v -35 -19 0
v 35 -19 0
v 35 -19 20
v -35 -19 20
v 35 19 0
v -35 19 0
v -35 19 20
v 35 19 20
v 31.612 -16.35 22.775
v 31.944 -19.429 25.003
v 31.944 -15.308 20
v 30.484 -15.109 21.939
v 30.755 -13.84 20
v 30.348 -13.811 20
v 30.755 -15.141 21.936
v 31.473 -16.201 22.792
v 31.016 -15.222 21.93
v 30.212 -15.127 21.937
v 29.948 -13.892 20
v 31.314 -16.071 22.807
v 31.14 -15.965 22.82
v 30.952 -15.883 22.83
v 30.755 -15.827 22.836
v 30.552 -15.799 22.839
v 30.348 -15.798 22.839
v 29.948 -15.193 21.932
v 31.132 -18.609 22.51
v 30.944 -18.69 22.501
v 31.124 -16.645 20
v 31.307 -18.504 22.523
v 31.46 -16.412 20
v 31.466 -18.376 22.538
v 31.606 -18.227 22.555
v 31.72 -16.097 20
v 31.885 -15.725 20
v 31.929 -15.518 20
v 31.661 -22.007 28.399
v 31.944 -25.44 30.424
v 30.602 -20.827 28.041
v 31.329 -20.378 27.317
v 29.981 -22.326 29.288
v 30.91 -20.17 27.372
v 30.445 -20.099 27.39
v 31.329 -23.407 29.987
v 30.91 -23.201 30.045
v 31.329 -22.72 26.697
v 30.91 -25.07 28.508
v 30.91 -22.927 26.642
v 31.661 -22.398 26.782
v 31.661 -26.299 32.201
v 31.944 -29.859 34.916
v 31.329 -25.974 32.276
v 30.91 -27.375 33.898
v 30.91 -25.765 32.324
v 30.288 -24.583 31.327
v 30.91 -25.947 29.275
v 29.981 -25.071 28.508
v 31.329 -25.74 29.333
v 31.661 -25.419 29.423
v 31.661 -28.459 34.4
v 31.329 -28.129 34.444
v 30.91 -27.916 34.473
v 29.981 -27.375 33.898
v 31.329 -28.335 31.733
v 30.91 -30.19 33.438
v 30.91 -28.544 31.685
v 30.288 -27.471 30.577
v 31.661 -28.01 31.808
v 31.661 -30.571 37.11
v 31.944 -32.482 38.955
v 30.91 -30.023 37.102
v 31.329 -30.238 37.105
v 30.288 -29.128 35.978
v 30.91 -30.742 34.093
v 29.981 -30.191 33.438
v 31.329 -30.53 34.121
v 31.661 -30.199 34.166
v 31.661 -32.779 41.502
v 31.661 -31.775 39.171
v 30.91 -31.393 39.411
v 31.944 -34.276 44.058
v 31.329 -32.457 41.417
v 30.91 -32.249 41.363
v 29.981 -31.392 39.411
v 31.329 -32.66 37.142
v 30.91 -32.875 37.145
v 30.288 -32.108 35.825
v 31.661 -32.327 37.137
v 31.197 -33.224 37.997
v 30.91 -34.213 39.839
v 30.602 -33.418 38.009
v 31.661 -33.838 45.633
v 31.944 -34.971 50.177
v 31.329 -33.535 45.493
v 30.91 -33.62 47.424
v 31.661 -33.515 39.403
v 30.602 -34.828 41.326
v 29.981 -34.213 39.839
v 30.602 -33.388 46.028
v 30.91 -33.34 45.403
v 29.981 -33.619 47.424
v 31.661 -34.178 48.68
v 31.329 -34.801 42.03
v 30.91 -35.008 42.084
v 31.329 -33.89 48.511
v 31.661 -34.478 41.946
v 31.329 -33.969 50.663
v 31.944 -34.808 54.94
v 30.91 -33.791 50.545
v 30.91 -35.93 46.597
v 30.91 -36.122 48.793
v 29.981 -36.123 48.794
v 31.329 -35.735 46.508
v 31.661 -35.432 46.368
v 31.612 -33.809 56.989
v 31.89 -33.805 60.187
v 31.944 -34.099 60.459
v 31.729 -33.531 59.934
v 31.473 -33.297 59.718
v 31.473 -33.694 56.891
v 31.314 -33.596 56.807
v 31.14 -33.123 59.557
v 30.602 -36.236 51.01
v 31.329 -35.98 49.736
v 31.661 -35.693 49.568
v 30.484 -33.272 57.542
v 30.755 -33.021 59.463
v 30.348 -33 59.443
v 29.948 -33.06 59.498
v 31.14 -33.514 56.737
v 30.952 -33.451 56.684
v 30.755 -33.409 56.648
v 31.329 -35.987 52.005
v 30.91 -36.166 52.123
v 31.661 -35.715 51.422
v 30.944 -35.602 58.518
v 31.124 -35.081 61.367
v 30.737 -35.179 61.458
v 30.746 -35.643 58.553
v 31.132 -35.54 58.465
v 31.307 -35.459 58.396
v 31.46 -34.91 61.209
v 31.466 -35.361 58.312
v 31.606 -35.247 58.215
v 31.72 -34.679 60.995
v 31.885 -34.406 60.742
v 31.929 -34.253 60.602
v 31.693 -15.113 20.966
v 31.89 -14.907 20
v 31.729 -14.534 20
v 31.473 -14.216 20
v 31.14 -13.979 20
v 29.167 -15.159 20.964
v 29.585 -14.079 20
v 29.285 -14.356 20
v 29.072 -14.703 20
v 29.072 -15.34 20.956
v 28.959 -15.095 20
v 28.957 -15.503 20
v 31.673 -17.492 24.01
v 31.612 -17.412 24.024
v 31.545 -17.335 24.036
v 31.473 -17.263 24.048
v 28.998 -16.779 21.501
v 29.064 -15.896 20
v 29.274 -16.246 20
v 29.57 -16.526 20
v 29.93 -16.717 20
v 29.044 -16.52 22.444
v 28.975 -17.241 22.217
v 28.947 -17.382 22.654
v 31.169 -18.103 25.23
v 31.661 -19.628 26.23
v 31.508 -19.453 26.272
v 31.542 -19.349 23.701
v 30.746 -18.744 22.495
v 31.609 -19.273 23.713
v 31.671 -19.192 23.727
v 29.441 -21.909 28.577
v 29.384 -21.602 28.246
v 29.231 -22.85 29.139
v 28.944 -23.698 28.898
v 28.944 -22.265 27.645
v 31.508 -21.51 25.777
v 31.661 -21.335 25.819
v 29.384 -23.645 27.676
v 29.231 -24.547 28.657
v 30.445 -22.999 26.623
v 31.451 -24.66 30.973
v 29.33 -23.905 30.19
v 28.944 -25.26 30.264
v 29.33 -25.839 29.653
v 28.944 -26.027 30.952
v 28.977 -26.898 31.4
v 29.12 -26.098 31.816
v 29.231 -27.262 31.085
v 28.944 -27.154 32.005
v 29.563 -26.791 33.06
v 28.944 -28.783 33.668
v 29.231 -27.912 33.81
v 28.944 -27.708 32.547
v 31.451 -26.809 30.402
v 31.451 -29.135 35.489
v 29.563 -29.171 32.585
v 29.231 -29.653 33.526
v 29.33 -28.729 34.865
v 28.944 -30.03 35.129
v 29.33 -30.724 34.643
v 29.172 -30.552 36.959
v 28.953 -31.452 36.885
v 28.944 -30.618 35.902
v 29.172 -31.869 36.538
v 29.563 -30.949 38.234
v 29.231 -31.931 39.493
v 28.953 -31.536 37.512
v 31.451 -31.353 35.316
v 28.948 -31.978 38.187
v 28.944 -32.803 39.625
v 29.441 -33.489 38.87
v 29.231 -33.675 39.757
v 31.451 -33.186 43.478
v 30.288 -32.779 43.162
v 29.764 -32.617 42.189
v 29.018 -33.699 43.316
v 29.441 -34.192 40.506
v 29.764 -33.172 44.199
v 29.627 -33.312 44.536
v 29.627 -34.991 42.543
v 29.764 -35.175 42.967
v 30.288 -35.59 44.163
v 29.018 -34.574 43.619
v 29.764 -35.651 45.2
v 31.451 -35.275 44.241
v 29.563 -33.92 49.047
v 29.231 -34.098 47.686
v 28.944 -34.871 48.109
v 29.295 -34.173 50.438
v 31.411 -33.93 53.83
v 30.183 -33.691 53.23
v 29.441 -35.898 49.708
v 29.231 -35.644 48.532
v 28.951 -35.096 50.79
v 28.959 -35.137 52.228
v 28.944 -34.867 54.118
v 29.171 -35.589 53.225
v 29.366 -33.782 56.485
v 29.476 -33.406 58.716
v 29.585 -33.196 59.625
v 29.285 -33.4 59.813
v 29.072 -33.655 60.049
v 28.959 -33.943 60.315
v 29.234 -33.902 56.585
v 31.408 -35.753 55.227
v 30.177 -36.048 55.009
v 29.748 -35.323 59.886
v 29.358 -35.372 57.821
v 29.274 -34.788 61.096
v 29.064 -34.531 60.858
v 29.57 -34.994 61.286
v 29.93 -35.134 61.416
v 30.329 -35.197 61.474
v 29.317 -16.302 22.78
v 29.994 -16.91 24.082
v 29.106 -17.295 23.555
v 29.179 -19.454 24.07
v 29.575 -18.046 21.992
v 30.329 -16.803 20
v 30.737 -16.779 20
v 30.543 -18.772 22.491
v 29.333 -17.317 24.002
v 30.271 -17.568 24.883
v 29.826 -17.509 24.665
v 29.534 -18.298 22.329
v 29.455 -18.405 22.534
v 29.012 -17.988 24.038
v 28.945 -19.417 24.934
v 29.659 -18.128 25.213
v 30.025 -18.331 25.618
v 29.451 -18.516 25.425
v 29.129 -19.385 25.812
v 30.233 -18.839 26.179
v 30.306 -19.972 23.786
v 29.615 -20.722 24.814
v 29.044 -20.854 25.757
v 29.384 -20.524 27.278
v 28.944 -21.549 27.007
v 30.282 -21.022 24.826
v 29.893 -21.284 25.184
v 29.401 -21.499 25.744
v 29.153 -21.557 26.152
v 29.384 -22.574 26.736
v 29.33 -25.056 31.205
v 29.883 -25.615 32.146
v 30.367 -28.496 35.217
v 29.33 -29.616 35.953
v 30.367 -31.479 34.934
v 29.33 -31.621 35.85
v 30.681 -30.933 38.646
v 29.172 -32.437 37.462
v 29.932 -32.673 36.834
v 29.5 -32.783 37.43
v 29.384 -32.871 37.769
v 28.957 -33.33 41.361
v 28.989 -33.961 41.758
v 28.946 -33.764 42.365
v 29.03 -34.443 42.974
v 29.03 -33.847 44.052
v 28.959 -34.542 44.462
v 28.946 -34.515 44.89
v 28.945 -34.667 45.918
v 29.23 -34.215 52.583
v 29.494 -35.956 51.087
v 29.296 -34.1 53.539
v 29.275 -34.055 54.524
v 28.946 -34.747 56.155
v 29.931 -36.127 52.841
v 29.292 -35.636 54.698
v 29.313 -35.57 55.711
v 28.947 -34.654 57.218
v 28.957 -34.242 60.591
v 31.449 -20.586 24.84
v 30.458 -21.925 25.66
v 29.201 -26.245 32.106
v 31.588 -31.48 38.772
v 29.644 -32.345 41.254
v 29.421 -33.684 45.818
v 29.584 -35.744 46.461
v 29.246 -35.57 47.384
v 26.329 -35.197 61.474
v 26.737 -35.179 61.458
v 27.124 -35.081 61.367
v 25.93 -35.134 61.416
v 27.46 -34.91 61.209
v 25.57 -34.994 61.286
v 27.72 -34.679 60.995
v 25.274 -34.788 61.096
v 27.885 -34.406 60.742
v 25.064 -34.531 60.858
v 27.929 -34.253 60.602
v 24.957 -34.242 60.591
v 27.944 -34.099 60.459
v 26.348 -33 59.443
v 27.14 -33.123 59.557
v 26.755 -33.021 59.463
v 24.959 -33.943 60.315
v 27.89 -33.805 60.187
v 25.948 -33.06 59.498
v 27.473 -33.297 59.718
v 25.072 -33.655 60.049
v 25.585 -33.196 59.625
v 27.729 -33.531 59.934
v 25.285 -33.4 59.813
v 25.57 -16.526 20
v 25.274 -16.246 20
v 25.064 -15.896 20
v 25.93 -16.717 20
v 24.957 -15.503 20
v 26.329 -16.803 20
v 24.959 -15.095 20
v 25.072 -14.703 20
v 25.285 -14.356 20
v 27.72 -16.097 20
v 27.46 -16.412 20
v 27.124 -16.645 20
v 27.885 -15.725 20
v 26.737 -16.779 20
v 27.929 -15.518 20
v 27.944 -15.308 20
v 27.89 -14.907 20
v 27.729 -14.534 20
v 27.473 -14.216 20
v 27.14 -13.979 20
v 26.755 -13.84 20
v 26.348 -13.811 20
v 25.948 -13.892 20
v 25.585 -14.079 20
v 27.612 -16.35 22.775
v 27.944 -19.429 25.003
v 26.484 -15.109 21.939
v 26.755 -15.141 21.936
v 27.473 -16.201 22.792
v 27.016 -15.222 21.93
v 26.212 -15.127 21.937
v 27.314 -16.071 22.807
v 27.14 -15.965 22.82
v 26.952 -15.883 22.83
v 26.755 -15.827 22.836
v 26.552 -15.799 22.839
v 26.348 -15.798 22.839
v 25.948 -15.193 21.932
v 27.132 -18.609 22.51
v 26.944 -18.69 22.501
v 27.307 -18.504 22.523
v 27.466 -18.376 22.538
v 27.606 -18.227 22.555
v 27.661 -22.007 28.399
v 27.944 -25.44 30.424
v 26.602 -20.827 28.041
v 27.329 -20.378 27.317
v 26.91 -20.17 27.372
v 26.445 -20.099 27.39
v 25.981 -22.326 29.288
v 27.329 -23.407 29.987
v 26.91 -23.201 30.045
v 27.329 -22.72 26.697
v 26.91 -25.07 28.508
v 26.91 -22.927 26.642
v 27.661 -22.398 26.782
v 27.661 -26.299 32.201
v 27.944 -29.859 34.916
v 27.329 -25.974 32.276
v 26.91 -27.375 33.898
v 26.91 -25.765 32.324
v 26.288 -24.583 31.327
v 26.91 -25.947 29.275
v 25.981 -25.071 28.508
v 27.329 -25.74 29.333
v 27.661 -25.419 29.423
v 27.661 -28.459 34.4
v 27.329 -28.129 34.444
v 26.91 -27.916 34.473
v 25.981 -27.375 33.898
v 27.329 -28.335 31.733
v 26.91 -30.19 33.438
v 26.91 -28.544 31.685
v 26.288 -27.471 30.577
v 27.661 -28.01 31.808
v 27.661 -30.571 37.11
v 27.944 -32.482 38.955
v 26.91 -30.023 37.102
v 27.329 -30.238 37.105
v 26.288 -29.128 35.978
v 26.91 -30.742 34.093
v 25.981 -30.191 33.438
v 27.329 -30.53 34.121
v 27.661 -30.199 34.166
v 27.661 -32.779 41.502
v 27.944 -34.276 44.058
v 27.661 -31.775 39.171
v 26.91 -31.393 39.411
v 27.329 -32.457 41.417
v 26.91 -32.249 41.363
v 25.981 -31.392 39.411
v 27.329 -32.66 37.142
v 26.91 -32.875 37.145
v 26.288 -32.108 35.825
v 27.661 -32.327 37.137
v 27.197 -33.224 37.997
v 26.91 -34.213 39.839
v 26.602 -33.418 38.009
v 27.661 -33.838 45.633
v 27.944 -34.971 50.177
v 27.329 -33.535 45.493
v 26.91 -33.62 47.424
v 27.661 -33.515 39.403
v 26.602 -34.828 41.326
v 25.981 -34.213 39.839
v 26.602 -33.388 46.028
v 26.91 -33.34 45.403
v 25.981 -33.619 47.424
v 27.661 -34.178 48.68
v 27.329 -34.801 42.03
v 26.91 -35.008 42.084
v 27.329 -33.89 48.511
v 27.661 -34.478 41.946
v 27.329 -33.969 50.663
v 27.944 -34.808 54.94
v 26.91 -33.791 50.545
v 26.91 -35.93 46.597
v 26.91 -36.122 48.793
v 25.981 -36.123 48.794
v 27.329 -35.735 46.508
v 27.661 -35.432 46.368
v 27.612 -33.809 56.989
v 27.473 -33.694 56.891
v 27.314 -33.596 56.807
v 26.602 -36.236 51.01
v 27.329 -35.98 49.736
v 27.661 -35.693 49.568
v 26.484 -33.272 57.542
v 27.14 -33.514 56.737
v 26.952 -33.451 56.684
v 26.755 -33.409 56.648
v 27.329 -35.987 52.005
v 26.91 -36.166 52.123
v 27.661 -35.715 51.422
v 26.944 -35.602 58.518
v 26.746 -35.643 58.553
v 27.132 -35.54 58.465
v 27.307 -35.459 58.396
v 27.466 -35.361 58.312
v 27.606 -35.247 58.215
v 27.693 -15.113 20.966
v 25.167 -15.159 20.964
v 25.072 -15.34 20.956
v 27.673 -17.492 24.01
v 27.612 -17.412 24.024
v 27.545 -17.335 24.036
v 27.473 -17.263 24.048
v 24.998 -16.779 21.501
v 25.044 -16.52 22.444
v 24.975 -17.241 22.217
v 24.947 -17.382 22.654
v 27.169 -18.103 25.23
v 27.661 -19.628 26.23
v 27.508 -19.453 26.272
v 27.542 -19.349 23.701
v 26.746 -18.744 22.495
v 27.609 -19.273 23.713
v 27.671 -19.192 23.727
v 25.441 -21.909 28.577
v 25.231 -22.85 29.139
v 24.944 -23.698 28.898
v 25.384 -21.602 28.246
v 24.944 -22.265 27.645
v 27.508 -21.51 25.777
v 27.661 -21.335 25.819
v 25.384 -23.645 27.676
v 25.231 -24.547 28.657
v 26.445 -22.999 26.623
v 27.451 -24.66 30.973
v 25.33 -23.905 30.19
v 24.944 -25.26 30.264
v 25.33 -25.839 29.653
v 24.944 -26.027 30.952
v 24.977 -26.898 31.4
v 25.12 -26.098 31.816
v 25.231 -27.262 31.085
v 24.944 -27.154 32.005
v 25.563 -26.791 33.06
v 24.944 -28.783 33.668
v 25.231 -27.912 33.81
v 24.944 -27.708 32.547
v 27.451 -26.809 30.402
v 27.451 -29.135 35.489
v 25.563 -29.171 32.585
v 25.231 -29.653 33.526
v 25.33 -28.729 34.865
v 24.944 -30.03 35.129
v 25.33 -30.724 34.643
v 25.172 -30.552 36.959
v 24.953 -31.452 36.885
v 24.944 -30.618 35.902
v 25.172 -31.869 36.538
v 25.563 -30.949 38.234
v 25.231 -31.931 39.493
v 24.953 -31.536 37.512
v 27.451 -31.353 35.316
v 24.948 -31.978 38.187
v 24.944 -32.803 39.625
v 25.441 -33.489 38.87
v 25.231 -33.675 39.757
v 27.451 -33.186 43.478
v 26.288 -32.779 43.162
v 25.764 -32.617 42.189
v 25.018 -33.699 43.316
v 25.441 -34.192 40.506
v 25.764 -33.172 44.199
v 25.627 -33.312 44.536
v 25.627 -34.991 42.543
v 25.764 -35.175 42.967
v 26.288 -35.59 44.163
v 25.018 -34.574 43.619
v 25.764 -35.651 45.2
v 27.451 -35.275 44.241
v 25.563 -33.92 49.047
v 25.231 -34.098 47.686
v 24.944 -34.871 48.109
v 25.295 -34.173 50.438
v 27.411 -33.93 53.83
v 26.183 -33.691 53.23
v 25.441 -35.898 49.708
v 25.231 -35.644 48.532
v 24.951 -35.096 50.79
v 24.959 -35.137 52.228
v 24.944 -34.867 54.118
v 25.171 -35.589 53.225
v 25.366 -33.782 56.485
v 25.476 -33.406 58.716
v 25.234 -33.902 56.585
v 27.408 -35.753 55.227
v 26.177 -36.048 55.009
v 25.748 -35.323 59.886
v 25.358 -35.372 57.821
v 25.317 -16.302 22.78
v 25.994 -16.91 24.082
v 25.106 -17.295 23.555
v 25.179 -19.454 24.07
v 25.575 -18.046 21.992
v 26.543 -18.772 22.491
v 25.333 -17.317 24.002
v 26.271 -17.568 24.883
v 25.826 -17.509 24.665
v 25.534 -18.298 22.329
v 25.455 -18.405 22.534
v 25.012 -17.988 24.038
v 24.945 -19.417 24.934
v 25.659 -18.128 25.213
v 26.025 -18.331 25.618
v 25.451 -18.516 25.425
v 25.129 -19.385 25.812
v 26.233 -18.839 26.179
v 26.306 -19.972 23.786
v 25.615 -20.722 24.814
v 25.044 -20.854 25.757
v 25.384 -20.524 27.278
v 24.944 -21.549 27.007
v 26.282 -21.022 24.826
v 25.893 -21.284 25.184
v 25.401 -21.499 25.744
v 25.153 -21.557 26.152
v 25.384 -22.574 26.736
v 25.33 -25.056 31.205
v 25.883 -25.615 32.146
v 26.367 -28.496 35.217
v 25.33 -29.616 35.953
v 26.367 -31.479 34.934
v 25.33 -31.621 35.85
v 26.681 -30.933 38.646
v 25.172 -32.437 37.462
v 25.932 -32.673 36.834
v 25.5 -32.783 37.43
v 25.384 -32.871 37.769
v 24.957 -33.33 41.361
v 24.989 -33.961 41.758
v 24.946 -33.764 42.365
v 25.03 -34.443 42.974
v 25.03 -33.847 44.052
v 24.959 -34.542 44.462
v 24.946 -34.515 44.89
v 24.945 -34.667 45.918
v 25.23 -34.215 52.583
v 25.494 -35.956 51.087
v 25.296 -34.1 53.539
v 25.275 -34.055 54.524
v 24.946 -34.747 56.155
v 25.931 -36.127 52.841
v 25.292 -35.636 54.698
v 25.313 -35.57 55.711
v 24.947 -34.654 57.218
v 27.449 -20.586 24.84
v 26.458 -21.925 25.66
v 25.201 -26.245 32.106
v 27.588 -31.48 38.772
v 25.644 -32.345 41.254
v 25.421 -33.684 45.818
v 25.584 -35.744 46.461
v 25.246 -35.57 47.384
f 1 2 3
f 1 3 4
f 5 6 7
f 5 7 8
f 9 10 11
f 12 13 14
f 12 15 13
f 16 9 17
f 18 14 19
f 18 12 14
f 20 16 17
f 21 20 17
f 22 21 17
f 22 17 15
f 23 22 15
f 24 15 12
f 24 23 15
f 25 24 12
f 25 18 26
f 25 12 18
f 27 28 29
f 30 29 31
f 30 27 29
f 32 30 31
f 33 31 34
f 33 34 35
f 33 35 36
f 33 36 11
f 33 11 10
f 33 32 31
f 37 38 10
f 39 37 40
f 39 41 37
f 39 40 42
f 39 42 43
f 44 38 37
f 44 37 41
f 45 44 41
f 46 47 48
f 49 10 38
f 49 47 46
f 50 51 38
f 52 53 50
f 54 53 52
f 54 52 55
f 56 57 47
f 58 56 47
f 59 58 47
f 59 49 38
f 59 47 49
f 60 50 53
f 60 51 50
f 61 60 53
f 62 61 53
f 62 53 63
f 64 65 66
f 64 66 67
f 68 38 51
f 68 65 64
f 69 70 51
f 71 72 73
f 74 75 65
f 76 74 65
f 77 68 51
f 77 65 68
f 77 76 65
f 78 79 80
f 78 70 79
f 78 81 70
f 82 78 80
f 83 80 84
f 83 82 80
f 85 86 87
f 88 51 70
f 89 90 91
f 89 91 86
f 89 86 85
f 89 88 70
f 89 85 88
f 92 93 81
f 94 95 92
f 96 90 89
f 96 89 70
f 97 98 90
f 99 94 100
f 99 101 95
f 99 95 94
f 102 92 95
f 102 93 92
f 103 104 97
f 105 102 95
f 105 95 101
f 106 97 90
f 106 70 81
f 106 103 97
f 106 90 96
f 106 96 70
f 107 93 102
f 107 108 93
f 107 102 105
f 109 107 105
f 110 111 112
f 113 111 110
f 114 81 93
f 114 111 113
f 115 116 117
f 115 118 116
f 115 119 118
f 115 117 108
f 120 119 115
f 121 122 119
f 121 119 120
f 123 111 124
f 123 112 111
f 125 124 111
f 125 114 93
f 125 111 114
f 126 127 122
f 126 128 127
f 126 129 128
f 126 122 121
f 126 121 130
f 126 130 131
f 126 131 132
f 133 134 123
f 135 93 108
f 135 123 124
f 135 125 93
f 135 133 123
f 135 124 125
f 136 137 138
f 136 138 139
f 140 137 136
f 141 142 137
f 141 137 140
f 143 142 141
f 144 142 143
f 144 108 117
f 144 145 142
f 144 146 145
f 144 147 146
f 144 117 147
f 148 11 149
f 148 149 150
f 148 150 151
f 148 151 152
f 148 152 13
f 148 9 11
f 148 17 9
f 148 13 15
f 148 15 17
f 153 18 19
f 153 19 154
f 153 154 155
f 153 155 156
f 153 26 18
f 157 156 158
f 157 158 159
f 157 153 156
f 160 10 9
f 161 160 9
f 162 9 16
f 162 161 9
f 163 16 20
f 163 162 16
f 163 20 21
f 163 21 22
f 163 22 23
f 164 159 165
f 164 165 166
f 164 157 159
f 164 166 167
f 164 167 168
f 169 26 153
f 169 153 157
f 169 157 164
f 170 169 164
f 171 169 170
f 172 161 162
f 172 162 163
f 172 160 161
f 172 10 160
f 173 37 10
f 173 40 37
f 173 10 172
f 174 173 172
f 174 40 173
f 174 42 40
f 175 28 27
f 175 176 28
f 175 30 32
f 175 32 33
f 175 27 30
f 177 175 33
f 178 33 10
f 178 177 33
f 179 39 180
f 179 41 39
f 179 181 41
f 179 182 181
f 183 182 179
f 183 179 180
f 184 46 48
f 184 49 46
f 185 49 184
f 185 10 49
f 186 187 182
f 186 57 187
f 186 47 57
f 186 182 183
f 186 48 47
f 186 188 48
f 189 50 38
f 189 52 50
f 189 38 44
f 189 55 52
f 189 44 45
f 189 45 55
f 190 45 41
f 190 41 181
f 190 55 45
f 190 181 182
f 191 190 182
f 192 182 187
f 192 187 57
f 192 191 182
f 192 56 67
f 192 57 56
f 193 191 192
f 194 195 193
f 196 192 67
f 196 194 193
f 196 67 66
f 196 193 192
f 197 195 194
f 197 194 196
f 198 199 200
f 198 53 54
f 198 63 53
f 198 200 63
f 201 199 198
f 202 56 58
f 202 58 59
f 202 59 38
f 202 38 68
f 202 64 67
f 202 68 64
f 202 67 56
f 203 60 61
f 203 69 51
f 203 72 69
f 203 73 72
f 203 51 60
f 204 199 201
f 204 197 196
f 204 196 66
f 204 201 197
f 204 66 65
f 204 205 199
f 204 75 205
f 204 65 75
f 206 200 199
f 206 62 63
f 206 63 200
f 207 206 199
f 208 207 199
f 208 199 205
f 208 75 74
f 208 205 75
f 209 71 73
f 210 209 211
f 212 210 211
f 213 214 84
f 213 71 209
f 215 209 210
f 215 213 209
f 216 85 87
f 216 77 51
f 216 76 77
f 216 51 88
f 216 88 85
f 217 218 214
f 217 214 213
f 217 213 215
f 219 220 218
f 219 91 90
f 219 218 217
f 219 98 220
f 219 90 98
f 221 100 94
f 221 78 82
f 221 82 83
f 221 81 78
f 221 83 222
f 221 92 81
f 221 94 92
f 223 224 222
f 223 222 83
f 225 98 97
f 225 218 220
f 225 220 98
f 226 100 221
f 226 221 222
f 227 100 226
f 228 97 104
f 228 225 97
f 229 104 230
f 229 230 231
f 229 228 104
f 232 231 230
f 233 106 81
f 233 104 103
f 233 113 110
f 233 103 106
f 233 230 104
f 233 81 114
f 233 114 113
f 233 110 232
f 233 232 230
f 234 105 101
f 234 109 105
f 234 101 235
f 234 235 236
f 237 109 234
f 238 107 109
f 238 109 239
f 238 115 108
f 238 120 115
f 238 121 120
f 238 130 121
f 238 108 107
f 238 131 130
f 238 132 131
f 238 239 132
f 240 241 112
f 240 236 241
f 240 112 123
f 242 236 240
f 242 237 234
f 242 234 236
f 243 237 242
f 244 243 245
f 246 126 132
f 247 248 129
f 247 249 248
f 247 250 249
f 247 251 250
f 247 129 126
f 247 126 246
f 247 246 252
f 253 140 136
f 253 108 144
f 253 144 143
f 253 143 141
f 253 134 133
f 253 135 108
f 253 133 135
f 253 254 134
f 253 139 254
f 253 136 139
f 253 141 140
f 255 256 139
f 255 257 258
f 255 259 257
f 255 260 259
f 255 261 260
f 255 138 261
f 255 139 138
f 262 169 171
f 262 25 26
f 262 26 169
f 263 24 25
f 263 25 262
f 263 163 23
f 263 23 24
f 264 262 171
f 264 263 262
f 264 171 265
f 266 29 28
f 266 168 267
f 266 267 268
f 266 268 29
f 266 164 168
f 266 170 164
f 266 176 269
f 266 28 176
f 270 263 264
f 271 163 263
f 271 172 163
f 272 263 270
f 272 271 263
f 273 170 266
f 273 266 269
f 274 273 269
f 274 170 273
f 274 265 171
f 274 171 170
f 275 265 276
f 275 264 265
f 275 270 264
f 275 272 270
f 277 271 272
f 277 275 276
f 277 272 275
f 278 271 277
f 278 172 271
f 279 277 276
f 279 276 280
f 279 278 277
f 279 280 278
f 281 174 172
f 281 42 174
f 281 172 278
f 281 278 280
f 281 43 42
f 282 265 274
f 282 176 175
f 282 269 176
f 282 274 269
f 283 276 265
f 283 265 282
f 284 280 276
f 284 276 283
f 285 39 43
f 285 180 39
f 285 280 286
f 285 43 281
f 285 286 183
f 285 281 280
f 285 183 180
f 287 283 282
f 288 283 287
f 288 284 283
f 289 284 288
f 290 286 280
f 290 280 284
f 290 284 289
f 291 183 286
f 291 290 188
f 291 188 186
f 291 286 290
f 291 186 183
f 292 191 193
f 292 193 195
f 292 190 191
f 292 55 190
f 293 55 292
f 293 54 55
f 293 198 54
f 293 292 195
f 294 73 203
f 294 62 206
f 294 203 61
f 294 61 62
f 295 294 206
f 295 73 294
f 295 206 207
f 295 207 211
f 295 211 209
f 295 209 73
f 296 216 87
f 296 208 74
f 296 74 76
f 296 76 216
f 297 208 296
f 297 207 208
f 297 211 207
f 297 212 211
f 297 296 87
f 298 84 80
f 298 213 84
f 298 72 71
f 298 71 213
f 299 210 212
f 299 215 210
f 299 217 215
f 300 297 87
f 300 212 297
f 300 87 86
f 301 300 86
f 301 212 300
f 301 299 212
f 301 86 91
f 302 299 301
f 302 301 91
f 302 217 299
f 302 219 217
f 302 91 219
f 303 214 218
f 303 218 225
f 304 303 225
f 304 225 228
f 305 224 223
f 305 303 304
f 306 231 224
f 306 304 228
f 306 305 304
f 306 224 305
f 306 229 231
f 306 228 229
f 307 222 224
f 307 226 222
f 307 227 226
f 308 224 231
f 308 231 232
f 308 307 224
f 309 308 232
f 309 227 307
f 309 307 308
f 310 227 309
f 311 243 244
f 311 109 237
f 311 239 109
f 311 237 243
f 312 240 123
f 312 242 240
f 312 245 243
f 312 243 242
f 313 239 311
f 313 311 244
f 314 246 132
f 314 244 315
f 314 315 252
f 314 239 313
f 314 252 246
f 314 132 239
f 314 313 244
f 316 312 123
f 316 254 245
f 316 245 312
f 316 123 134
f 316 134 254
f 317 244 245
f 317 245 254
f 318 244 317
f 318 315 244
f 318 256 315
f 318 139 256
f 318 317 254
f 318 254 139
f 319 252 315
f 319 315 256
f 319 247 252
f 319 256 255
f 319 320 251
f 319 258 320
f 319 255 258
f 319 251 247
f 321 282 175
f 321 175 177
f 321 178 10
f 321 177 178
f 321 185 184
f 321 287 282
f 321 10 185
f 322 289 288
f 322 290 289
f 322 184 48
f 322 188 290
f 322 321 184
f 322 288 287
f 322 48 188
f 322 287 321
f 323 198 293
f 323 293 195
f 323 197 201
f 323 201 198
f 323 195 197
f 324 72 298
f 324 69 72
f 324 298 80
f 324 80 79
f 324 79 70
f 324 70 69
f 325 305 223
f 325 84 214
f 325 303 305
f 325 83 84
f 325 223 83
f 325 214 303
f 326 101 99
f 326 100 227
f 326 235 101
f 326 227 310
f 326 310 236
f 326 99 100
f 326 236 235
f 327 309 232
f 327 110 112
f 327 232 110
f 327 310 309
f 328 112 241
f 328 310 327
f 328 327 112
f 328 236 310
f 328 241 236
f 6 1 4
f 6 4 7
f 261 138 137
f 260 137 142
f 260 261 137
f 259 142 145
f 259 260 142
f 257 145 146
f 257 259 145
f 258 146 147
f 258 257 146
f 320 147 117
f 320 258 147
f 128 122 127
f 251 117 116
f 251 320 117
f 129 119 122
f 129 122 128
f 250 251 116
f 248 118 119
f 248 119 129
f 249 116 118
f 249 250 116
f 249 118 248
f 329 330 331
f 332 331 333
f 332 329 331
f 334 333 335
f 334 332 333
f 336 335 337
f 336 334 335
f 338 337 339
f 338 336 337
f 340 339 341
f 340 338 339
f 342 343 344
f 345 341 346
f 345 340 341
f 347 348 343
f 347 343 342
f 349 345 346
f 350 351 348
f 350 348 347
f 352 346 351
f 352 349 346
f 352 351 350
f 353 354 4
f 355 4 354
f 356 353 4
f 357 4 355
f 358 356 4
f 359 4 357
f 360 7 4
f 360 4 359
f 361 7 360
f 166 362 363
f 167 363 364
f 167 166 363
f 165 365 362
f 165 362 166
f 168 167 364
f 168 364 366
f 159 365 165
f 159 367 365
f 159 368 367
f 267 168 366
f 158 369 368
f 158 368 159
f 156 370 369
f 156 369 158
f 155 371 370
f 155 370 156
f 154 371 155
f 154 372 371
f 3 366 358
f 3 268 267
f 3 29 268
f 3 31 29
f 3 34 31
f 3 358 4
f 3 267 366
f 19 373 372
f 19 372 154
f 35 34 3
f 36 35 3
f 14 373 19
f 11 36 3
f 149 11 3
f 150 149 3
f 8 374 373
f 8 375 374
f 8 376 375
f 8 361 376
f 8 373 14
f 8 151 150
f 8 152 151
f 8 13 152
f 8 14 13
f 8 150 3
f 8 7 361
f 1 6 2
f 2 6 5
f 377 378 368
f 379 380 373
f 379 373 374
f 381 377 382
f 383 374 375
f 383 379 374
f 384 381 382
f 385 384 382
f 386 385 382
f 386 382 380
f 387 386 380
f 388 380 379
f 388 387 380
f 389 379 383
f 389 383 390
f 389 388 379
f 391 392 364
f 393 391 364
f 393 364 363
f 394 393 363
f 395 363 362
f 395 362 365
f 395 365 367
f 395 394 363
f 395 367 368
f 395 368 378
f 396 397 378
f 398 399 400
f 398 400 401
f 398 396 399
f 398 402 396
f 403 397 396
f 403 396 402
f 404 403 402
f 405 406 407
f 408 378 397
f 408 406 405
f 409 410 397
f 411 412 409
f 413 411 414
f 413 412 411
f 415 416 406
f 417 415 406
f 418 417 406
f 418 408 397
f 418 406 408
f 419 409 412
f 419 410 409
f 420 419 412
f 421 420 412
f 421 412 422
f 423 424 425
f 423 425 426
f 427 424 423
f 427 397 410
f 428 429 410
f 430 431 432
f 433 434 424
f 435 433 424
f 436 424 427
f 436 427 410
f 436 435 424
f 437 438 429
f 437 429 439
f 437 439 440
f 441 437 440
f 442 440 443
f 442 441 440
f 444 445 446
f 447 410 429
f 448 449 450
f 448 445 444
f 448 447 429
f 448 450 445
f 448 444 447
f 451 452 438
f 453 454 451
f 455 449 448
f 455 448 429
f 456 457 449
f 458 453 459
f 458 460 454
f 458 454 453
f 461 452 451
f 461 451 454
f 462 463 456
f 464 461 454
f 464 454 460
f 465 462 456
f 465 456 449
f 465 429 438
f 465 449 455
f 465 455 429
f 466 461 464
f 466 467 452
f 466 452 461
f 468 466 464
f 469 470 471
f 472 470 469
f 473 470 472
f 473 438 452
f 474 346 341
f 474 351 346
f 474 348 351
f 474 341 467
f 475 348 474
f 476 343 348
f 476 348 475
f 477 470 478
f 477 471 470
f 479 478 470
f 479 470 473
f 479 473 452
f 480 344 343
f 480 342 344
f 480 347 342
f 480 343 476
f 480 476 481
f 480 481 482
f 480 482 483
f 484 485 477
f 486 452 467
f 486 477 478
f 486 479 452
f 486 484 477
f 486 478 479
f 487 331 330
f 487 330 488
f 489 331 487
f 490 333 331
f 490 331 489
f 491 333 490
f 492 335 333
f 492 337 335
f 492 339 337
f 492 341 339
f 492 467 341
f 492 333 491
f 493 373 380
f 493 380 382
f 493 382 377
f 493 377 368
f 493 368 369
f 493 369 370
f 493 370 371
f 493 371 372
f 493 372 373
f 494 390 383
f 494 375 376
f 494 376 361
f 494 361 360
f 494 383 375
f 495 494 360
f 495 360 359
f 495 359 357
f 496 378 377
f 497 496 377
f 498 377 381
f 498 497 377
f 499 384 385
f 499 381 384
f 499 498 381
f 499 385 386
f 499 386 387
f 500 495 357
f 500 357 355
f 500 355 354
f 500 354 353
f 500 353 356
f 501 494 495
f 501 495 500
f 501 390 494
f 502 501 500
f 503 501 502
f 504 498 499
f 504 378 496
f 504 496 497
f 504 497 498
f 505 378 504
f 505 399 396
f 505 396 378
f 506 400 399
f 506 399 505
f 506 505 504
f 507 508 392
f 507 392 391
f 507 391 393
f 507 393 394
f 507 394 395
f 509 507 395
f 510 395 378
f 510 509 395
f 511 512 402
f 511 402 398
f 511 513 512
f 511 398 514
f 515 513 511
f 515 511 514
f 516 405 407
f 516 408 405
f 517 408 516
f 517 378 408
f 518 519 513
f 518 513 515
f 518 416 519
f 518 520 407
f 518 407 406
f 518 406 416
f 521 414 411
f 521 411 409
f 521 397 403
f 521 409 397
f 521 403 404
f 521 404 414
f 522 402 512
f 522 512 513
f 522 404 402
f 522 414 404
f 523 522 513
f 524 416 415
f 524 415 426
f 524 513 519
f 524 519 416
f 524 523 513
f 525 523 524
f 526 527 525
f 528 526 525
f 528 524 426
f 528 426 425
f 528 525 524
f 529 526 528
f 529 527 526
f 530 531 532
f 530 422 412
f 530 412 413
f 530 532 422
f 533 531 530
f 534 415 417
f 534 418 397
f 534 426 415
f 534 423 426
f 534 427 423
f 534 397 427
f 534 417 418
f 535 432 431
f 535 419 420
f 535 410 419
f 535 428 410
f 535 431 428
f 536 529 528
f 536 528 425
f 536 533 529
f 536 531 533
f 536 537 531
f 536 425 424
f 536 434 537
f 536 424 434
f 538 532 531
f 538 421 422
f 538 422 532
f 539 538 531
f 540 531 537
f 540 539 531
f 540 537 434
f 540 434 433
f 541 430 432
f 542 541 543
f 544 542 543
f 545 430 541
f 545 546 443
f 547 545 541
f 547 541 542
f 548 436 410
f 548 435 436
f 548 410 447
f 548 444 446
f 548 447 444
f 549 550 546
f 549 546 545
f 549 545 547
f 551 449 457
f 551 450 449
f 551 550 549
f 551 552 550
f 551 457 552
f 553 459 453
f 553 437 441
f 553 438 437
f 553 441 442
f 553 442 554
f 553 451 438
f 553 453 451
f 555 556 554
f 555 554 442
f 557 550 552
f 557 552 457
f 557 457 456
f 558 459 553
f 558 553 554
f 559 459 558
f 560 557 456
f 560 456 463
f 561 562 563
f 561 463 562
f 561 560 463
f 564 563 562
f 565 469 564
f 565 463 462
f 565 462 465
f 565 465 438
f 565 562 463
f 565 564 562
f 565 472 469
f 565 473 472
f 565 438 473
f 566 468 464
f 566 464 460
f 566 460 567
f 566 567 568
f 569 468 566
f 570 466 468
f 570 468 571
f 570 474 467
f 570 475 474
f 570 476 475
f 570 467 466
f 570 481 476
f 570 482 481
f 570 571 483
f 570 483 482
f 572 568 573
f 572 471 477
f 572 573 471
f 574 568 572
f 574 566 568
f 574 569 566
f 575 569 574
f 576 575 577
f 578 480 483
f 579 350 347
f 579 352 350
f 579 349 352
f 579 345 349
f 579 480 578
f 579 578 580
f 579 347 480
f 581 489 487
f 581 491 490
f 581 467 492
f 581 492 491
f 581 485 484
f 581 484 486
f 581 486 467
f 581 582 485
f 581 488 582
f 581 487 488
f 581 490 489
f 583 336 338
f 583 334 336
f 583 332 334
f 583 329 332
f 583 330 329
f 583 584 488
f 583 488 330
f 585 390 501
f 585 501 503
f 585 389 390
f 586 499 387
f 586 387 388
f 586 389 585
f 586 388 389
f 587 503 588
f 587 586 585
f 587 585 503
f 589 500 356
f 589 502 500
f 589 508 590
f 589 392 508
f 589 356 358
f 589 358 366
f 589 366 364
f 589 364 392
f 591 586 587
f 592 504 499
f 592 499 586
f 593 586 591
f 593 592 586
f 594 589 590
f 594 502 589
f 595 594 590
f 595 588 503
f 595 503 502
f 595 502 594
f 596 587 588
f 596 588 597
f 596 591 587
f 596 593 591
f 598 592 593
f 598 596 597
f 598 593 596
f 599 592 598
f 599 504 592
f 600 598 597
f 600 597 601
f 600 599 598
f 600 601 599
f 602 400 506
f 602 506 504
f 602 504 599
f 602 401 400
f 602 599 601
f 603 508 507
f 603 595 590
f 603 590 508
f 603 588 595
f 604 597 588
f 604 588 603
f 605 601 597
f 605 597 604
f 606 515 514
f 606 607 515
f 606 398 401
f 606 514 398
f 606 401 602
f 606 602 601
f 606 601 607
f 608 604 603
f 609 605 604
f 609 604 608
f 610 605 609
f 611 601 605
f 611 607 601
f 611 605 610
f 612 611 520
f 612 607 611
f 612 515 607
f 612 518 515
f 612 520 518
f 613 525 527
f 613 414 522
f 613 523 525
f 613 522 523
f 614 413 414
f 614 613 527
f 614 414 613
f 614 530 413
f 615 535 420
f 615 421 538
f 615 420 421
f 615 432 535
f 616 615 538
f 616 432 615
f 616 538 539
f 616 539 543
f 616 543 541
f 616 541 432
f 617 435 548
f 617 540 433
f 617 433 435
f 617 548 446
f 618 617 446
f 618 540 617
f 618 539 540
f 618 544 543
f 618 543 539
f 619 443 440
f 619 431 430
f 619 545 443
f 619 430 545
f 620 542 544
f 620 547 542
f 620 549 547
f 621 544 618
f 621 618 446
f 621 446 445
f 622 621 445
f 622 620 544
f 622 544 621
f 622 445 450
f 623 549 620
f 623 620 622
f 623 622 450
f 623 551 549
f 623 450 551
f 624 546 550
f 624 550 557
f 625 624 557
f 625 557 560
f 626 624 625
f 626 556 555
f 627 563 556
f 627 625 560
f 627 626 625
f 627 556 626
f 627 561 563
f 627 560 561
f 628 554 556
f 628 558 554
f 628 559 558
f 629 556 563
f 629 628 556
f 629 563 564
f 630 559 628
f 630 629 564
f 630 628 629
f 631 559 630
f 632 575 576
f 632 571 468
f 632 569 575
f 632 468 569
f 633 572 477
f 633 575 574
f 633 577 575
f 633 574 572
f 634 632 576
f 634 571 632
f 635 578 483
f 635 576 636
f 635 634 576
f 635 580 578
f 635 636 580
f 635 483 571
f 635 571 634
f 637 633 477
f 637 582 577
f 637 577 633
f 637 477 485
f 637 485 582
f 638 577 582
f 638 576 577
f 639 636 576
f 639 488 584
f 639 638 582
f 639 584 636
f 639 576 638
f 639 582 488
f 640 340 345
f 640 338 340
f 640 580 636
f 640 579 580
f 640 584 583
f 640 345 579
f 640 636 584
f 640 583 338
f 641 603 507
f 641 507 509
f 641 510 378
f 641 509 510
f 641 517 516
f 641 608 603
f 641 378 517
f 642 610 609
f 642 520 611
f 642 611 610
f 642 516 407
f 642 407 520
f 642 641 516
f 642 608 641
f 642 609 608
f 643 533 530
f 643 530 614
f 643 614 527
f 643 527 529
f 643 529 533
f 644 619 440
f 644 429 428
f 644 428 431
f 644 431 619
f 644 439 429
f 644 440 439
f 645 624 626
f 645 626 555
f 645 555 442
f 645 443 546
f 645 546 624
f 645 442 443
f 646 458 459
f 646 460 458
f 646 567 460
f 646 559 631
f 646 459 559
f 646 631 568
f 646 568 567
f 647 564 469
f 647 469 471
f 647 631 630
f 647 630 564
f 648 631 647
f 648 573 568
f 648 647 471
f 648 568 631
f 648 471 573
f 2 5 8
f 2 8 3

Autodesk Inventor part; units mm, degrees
ref_plane "YZ Plane" through (0, 0, 0) normal (1, 0, 0) x (0, 1, 0)
ref_plane "XZ Plane" through (0, 0, 0) normal (0, 1, 0) x (-1, 0, 0)
sketch "Sketch1" plane through (0, 0, 0) normal (0, 0, 1) x (1, 0, 0)
  line L0 (-35, 19) -> (35, 19)
  line L1 (35, 19) -> (35, -19)
  line L2 (35, -19) -> (-35, -19)
  line L3 (-35, -19) -> (-35, 19)
  line L4 (-35, 19) -> (35, -19) construction
  line L5 (35, 19) -> (-35, -19) construction
  point P0 (0, 0)
  dimension "d0" = 70
  dimension "d1" = 38
extrude "Extrusion1" add sketch "Sketch1" along normal blind 20
sketch "Sketch2" plane through (0, 0, 20) normal (0, 0, 1) x (1, 0, 0)
  circle A0 centre (26.4443, -15.3077) radius 1.5
  circle A1 centre (30.4443, -15.3077) radius 1.5
  point P0 (0, 0)
  dimension "d4" = 3
  dimension "d5" = 3
  dimension "d6" = 4
ref_plane "Work Plane2" through (26.4443, -15.3077, 20) normal (1, 0, 0) x (0, 1, 0)
sketch "Sketch3" plane through (26.4443, -15.3077, 20) normal (1, 0, 0) x (0, 1, 0)
  line L0 (0, 0) -> (-8.28, 12.6748) construction
  line L1 (-8.28, 12.6748) -> (-23.4846, 12.6748) construction
  line L2 (-23.4846, 12.6748) -> (-18.7913, 40.4591) construction
  spline S0 degree 3 poles (0, 0) (-8.28, 12.6748) (-23.4846, 12.6748) (-18.7913, 40.4591) knots 1 1 1 1 2 2 2 2
  point P0 (15.3077, -20)
sweep "Sweep1" add profiles "Sketch2" path "Sketch3" contours A0
pattern_linear "Rectangular Pattern1" count 2 spacing 4 along (1, 0, 0) of "Sweep1"
properties part number "battery_5V"
